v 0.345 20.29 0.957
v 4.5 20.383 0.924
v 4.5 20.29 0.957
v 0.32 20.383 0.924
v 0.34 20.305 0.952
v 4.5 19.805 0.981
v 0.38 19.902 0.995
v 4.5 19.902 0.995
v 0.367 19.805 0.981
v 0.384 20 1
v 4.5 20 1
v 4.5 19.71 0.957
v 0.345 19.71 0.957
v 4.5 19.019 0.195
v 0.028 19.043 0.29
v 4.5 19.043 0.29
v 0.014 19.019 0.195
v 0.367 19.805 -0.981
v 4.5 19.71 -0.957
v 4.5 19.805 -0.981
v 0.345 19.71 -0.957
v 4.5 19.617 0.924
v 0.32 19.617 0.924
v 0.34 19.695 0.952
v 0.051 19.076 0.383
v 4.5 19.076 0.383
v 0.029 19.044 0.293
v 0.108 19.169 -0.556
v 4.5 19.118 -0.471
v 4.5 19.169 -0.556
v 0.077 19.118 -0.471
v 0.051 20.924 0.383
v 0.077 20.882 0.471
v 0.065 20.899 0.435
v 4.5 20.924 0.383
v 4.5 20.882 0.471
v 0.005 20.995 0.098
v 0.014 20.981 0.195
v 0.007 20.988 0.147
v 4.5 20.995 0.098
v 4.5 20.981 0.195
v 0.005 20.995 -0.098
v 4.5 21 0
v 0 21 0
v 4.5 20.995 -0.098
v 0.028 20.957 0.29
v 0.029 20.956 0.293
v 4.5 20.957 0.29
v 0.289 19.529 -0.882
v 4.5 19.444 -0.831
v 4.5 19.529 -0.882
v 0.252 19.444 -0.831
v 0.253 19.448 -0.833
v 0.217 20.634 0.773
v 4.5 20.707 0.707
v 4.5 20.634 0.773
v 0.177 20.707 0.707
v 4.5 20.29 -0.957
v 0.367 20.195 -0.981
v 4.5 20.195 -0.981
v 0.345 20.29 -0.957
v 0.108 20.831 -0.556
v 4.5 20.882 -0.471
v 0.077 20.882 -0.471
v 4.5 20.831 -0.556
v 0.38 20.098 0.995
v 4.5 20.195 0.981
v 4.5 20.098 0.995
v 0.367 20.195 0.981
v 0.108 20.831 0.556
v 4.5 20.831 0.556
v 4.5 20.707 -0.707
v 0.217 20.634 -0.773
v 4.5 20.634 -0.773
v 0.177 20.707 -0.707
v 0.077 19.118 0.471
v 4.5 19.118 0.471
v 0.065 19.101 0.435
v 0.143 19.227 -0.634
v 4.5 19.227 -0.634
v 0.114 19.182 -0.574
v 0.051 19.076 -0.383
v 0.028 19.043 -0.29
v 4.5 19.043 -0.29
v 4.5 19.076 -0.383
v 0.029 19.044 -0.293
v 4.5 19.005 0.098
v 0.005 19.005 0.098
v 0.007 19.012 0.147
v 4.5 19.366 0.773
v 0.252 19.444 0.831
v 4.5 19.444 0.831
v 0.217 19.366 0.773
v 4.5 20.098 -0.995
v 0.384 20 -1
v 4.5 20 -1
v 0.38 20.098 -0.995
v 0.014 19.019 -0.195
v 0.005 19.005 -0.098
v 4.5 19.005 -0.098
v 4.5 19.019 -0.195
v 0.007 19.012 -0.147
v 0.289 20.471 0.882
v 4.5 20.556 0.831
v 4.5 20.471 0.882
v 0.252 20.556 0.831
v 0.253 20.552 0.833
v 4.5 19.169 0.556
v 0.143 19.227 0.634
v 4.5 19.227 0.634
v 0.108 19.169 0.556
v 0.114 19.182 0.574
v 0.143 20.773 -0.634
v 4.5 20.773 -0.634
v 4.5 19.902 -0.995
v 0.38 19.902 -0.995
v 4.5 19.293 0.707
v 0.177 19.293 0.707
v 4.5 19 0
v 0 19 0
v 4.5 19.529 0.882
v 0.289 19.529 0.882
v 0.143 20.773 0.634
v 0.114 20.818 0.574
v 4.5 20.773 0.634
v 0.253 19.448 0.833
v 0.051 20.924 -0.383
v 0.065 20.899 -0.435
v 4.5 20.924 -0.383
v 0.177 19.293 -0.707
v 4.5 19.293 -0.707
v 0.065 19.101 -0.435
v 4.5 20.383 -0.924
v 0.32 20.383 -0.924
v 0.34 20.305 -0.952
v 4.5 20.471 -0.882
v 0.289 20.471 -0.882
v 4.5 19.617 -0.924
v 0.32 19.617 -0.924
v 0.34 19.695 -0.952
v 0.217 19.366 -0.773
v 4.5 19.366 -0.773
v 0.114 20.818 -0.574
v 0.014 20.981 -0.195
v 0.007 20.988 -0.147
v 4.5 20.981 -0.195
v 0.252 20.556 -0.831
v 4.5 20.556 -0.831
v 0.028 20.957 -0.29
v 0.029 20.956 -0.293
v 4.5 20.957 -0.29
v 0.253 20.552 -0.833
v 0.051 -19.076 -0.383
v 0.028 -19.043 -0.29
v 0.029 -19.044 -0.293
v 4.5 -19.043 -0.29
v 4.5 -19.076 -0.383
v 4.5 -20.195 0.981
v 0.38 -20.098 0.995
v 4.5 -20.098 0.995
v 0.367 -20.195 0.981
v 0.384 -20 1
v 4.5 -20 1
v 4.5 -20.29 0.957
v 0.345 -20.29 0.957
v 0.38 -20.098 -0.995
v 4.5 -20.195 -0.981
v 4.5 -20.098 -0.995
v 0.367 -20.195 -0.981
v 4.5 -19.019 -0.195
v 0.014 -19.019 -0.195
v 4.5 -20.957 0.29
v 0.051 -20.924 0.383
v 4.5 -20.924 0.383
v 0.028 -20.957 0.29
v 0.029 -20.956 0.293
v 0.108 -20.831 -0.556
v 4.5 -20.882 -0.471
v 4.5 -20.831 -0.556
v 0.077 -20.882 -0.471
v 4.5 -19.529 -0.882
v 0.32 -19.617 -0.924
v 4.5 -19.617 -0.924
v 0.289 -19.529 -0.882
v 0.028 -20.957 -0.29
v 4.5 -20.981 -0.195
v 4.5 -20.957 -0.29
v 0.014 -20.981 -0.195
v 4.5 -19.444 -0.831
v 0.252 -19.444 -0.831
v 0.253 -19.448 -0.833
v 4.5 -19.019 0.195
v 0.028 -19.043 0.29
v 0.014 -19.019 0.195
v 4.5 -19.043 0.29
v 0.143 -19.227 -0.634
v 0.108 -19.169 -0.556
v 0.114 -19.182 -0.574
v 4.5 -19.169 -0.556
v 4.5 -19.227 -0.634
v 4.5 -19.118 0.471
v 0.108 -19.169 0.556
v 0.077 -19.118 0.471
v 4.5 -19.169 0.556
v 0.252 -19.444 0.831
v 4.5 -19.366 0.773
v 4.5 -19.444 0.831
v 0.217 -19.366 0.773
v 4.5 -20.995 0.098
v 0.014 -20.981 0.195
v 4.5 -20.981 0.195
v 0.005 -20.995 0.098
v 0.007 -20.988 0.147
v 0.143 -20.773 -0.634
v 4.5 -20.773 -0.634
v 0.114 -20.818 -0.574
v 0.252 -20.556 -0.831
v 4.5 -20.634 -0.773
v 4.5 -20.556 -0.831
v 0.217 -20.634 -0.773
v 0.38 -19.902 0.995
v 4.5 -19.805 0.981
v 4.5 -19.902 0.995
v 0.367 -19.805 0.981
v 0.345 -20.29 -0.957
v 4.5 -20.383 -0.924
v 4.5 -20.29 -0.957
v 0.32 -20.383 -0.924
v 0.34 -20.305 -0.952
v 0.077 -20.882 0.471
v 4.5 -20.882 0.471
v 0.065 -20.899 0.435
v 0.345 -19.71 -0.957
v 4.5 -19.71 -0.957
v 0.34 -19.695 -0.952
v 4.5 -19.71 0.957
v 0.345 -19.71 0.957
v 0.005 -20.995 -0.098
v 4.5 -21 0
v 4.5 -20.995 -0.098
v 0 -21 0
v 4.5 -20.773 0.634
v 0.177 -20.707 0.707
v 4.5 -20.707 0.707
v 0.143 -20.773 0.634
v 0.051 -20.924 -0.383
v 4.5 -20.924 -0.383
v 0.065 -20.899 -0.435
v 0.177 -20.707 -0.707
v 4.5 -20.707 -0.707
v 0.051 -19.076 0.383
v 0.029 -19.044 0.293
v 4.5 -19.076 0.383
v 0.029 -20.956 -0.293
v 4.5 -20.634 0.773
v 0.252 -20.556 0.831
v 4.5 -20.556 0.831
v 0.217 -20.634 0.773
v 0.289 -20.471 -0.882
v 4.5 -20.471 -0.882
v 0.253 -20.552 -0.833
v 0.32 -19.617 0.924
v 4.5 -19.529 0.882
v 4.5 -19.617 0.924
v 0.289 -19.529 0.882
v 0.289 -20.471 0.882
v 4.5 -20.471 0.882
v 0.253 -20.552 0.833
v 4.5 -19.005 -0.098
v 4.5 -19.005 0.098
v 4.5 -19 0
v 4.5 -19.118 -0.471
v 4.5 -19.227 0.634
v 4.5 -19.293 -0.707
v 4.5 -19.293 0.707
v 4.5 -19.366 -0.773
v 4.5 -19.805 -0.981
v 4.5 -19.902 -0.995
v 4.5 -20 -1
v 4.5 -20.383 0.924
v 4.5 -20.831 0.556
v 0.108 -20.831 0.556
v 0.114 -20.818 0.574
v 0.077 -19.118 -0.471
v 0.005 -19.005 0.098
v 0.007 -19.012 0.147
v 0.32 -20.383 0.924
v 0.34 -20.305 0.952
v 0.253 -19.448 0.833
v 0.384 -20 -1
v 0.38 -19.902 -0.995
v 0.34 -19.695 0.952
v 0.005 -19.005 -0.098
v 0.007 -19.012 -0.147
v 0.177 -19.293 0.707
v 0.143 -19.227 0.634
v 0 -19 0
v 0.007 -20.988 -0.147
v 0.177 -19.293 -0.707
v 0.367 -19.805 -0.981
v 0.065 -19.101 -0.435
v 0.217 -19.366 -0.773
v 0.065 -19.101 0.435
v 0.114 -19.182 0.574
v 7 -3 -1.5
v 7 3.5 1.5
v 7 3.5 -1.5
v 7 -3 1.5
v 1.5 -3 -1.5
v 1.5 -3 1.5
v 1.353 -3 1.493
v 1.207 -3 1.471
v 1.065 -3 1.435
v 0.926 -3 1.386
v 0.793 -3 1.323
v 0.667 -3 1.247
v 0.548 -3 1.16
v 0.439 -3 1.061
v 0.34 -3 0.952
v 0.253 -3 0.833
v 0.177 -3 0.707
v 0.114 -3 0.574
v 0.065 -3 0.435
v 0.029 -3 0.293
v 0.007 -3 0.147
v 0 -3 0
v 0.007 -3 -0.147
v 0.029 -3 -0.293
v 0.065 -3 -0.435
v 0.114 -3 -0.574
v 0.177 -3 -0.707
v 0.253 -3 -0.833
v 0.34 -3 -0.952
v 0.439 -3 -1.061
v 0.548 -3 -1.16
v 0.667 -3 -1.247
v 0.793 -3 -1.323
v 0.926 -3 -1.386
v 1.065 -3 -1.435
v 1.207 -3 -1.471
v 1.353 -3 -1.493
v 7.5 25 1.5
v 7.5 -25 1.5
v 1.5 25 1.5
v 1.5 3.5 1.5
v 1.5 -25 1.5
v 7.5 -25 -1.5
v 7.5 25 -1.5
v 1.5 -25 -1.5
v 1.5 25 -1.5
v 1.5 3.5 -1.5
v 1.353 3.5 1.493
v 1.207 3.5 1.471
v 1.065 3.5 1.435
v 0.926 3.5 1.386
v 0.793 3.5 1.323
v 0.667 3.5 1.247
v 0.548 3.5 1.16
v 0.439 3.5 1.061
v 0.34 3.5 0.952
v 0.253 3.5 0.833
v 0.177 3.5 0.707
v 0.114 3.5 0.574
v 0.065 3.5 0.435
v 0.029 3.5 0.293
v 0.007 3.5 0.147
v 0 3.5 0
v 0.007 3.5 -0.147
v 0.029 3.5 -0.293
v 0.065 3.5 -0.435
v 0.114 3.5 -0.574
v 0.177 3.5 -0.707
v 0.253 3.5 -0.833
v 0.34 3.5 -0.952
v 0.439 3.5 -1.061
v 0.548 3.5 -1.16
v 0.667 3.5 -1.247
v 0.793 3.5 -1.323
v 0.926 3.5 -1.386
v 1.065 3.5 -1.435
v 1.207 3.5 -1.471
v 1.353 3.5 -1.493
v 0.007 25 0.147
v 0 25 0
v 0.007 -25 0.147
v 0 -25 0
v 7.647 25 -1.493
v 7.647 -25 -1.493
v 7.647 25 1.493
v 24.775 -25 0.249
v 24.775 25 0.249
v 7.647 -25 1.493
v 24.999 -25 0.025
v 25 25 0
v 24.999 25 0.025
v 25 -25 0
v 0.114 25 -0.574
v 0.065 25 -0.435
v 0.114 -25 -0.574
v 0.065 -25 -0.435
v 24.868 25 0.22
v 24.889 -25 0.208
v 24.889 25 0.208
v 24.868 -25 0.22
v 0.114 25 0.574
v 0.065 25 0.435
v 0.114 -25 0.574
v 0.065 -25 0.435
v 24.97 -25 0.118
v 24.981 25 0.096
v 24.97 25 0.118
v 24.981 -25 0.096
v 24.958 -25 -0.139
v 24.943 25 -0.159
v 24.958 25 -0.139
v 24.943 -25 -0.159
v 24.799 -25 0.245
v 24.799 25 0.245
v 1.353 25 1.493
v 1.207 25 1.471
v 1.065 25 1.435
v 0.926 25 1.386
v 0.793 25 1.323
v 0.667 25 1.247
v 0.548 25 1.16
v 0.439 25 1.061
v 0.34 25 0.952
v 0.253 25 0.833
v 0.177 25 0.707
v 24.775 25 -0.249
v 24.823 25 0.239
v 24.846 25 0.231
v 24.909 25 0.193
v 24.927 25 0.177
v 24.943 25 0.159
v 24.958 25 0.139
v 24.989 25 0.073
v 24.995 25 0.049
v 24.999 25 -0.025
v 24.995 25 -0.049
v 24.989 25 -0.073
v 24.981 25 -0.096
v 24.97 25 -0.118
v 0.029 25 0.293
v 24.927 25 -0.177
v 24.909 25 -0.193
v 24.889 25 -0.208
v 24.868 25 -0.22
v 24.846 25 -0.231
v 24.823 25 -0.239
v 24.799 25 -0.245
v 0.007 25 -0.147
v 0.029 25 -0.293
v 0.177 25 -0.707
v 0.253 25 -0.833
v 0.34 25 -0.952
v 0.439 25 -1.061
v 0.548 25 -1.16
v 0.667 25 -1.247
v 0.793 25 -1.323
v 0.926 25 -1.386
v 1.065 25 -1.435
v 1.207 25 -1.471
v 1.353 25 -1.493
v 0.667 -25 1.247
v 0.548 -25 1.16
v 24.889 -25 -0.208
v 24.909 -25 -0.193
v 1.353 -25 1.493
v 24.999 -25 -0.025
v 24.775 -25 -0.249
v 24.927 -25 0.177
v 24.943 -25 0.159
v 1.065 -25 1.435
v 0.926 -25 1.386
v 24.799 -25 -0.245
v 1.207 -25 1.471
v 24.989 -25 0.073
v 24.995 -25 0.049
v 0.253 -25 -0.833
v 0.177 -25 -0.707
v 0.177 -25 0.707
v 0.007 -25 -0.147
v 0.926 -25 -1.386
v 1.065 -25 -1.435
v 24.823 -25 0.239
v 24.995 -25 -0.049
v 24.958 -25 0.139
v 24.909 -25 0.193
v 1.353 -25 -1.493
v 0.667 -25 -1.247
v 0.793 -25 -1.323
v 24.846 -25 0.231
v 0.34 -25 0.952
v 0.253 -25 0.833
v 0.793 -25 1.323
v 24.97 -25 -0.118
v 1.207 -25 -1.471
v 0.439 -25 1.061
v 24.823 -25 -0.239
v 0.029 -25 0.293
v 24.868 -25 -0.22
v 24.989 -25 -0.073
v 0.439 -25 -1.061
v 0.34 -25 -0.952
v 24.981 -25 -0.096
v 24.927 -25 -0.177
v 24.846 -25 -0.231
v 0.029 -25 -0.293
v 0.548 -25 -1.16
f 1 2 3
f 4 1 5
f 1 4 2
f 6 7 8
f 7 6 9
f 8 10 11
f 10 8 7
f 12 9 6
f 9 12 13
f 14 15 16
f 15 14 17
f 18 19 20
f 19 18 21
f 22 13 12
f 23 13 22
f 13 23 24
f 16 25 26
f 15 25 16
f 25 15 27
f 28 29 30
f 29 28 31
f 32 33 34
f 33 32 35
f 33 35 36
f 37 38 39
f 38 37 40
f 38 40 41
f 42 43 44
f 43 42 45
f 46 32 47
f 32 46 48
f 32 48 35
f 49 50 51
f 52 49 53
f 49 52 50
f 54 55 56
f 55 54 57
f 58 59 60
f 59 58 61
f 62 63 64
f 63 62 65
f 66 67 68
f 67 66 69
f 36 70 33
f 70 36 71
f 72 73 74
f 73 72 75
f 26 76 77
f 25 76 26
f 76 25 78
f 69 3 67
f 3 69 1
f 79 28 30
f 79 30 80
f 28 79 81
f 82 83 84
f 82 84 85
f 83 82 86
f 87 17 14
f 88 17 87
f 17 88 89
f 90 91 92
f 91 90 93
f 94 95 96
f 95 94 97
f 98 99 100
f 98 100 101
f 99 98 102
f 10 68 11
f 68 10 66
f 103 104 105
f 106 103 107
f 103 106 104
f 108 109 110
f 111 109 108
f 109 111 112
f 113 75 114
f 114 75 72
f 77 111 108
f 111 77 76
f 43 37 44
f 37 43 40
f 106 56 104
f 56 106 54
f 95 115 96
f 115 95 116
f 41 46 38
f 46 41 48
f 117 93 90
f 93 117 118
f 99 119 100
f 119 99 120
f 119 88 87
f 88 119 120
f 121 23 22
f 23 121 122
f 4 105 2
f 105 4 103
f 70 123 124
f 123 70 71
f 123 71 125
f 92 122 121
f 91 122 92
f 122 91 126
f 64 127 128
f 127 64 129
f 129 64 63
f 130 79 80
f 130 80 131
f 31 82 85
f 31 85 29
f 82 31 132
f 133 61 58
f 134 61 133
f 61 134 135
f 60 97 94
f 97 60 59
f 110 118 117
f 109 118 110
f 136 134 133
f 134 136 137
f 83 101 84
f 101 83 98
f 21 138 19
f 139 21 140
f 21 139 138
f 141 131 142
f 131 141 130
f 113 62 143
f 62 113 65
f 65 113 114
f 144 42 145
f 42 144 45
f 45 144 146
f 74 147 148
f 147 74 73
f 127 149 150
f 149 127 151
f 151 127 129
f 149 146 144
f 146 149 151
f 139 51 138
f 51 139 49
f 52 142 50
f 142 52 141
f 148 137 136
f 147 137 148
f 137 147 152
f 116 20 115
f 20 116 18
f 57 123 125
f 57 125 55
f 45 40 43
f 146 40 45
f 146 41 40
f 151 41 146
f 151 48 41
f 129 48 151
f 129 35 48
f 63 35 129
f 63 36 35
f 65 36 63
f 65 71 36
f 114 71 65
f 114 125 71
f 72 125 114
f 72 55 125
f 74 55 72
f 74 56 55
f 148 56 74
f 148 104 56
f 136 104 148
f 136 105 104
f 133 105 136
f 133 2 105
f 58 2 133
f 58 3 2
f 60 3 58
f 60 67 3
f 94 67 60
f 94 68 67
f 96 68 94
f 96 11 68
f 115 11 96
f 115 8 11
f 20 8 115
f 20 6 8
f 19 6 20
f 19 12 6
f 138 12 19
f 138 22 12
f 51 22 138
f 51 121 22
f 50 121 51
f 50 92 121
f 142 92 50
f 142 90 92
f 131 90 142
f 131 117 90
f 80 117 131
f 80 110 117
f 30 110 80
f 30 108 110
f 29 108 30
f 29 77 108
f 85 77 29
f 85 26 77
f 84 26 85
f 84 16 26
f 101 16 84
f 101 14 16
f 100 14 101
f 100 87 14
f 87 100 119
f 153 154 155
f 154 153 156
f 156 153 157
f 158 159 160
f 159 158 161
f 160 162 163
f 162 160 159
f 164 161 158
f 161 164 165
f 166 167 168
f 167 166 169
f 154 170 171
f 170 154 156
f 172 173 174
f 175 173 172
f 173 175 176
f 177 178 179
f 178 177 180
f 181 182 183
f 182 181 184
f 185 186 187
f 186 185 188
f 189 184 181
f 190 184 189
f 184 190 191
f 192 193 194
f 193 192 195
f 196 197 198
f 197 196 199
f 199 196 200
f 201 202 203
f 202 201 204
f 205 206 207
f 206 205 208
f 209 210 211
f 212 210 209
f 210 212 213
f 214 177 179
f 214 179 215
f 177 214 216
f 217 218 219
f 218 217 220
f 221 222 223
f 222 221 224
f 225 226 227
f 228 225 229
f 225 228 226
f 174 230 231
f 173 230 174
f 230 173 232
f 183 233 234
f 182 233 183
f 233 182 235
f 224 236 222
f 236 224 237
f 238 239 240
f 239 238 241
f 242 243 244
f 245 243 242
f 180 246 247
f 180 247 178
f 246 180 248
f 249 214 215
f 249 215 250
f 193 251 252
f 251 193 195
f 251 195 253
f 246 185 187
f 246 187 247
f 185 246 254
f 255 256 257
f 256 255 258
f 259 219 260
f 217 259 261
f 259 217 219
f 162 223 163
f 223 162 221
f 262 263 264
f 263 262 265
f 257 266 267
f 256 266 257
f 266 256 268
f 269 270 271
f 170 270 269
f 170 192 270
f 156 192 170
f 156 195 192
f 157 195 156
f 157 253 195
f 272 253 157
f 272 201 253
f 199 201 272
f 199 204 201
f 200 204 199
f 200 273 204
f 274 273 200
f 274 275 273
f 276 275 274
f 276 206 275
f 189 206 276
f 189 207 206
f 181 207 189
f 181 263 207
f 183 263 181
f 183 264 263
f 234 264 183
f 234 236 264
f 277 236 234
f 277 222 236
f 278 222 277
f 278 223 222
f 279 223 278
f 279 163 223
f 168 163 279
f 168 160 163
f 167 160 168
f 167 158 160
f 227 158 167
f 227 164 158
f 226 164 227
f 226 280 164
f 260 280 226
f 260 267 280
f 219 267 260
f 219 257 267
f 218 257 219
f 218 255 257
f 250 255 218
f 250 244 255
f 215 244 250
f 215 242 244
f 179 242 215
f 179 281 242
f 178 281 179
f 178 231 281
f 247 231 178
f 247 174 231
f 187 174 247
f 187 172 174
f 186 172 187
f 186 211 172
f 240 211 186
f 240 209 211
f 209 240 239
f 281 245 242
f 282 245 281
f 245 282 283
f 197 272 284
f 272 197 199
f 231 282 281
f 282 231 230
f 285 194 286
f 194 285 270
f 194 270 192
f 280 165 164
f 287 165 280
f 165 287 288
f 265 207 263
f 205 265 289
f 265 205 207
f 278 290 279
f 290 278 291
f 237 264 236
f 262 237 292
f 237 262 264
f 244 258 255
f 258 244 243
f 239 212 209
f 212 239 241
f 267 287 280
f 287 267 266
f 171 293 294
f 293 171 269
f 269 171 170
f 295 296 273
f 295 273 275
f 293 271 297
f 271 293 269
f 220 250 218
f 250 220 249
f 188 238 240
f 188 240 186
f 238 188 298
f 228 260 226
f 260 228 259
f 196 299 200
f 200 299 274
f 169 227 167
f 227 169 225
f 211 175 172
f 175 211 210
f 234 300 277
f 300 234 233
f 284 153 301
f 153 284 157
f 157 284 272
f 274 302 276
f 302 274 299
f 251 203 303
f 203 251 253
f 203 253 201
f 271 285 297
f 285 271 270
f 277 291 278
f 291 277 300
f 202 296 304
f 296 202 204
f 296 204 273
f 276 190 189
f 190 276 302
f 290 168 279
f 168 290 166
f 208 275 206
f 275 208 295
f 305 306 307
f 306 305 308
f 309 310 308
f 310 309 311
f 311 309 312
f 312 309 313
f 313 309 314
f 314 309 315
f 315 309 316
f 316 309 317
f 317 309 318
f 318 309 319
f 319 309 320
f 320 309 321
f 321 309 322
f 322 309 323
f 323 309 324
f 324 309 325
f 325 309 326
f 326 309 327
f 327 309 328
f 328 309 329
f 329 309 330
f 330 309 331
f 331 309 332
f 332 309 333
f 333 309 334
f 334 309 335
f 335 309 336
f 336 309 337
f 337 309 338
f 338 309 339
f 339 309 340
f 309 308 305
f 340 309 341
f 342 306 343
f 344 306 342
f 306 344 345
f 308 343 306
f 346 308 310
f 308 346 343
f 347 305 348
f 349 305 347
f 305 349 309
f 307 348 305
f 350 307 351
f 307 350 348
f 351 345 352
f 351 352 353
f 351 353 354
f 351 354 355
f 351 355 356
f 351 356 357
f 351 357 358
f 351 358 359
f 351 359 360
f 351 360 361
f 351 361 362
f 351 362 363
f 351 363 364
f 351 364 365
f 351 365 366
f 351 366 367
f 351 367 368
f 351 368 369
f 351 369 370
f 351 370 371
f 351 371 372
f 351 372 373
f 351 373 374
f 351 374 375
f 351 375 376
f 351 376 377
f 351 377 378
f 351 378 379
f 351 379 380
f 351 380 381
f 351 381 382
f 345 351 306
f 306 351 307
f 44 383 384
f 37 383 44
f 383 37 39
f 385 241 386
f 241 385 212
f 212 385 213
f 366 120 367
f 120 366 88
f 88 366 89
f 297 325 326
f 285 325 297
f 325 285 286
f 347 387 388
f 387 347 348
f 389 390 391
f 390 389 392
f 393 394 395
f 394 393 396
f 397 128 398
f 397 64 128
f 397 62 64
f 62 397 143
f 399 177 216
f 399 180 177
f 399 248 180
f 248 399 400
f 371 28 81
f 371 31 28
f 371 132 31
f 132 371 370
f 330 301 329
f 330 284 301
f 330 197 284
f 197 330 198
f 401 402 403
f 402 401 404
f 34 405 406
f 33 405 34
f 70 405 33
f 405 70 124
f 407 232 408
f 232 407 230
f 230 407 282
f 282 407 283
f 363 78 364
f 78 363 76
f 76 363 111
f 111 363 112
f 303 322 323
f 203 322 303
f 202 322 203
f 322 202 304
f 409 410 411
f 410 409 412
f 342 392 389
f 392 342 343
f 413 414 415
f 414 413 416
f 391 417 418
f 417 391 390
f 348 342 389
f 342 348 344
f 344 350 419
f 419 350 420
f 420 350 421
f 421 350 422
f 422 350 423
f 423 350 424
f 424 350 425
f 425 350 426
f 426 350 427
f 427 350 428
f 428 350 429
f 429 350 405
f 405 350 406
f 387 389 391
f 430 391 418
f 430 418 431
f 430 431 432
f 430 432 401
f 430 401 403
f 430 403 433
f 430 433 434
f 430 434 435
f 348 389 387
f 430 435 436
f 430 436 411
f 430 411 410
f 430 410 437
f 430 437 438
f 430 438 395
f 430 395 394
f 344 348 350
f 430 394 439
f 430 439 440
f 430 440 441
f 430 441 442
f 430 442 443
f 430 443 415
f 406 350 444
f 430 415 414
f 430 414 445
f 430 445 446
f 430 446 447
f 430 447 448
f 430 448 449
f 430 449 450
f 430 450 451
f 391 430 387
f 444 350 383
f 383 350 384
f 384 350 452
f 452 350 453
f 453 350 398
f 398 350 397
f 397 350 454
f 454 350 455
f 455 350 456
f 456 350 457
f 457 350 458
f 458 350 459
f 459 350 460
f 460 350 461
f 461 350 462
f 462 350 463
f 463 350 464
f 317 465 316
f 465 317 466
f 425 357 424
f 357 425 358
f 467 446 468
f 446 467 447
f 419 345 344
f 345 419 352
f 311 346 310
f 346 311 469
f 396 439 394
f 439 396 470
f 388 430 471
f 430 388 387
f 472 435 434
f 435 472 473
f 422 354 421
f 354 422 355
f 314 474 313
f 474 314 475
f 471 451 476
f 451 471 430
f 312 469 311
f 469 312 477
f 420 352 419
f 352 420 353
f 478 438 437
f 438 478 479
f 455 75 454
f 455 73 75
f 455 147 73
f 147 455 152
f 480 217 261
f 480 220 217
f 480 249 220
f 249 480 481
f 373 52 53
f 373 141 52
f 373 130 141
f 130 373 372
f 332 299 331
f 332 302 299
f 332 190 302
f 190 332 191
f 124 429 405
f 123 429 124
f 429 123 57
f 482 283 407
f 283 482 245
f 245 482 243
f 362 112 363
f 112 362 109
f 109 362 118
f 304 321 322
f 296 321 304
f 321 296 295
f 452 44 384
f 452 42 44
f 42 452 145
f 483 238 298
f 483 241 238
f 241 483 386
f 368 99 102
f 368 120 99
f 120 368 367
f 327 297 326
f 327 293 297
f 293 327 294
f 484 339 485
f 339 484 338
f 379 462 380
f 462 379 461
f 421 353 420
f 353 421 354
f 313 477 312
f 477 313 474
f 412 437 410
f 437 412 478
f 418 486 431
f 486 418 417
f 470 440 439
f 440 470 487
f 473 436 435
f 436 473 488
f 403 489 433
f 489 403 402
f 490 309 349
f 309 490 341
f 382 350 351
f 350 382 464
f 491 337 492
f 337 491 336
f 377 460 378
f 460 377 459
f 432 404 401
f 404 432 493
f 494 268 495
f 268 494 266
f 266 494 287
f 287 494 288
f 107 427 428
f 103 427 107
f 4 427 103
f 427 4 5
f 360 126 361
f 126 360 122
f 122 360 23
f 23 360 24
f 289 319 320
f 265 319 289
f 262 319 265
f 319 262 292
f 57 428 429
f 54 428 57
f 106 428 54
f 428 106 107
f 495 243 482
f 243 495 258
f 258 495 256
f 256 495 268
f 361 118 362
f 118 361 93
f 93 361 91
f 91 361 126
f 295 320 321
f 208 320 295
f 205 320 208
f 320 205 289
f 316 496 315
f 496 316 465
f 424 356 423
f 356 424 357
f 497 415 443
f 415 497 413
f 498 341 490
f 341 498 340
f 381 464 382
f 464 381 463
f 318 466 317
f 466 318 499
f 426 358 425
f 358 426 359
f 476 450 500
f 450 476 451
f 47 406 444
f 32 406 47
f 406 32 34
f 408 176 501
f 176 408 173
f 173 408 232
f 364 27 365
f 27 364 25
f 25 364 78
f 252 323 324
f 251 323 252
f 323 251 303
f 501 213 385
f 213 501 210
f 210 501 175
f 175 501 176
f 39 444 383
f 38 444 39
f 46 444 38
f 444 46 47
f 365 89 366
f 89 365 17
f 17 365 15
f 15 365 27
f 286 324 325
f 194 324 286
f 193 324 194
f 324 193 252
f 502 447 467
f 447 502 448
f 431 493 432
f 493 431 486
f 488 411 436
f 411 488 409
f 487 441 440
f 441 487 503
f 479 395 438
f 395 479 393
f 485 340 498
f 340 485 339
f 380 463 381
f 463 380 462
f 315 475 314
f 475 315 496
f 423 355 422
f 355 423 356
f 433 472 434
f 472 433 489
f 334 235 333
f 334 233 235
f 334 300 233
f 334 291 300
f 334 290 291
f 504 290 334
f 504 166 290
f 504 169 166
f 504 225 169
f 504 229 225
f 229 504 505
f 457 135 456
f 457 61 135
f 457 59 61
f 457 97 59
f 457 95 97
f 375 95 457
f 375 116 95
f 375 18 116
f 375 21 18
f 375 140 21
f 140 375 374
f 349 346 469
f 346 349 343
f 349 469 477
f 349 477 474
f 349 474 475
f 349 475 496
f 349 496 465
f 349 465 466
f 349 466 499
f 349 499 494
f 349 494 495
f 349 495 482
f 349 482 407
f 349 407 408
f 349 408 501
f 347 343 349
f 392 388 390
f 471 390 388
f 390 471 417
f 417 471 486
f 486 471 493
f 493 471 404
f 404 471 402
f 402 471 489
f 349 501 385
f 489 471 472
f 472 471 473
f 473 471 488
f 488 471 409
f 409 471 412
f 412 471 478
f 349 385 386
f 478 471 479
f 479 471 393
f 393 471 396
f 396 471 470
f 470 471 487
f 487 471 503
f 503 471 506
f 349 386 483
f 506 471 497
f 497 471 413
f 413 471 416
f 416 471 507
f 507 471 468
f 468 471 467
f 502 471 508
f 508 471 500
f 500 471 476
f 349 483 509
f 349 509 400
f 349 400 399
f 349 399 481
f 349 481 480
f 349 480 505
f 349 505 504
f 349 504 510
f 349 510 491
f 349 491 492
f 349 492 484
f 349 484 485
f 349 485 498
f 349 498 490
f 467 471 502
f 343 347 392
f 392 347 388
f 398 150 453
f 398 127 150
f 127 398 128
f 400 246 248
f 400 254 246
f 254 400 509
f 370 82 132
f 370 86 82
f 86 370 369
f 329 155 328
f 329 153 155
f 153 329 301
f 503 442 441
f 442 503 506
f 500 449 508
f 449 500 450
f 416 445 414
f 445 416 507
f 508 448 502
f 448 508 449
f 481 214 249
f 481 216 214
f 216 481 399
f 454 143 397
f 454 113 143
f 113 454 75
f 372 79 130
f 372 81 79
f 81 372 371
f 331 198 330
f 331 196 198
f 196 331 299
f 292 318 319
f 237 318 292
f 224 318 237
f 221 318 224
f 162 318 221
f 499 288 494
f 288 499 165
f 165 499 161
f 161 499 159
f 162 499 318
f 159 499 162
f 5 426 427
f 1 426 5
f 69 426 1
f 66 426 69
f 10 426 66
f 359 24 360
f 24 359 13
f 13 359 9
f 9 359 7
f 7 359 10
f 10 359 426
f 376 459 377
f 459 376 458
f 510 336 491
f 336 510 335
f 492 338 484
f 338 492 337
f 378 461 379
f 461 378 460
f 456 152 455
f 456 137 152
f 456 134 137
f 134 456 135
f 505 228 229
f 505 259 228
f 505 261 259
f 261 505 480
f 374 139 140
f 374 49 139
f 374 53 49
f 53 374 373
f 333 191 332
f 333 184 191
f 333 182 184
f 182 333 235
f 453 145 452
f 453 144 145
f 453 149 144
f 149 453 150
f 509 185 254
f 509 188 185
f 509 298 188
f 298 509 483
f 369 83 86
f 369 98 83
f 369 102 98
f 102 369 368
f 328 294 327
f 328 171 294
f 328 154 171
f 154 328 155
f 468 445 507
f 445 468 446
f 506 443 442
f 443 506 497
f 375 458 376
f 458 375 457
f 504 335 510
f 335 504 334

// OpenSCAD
// file: config.scad
// config.scad - Central configuration for Rocket Fin Servo Mount System
// All dimensions in millimeters

// ============================================================================
// SERVO SPECIFICATIONS (3.7g Micro Servo)
// ============================================================================

servo_body_length = 20.0;      // X dimension
servo_body_width = 8.75;       // Y dimension
servo_body_height = 22.0;      // Z dimension (including gear case)
servo_tab_thickness = 2.0;     // Mounting tab thickness
servo_tab_extension = 2.0;     // How far tabs extend beyond body
servo_tab_height = 15.5;       // Height from bottom to tab underside
servo_shaft_diameter = 4.0;    // Output shaft diameter
servo_shaft_offset_x = 5.0;    // Shaft offset from body center (toward one end)
servo_shaft_offset_z = 2.0;    // Shaft height above body top
servo_cable_diameter = 3.0;    // Cable bundle diameter

// Clearances for servo pocket
servo_clearance = 0.3;         // Extra space around servo body

// ============================================================================
// FIN SPECIFICATIONS
// ============================================================================

fin_thickness = 4.0;           // Carbon fibre fin thickness
fin_slot_clearance = 0.2;      // Extra space in slot for easy insertion
fin_engagement_depth = 10.0;   // How deep fin inserts into mount

// ============================================================================
// AILERON SPECIFICATIONS
// ============================================================================

aileron_span = 50.0;           // Y dimension (along fin span)
aileron_chord = 25.0;          // X dimension (depth in flow direction)
aileron_thickness = 3.0;       // Z dimension (max thickness)
aileron_le_radius = 1.5;       // Leading edge radius (full round)
aileron_te_thickness = 0.5;    // Trailing edge minimum thickness
aileron_max_deflection = 30;   // Maximum deflection in degrees

// Hinge geometry
aileron_hinge_hole_dia = 2.0;  // For M2 pins
aileron_hinge_spacing = 40.0;  // Distance between hinge holes
aileron_hinge_offset = 2.0;    // Distance from leading edge to hinge center

// Servo interface
aileron_slot_width = 3.0;      // Width of adapter slot
aileron_slot_depth = 5.0;      // Depth of adapter slot

// ============================================================================
// SERVO MOUNT HOUSING
// ============================================================================

mount_wall_thickness = 2.0;    // Minimum wall thickness
mount_fairing_radius = 8.0;    // Rounding on leading/trailing edges
mount_total_length = 35.0;     // Overall X dimension
mount_total_width = 16.0;      // Overall Y dimension

// Calculated pocket dimensions (with clearances)
mount_pocket_length = servo_body_length + servo_clearance;
mount_pocket_width = servo_body_width + servo_clearance;
mount_pocket_height = servo_body_height + servo_clearance;

// Wire channel
wire_channel_diameter = 4.0;   // Diameter of cable routing channel

// Retention features
retention_barb_height = 0.8;   // Height of retention barbs
retention_barb_depth = 1.0;    // Depth of barb engagement

// ============================================================================
// SERVO ARM ADAPTER
// ============================================================================

adapter_horn_plate_dia = 7.0;  // Diameter of horn interface plate
adapter_horn_hole_dia = 1.5;   // Holes for horn screws
adapter_horn_hole_spacing = 4.0; // Spacing between horn holes (cross pattern)
adapter_post_height = 8.0;     // Height of connecting post
adapter_post_diameter = 3.0;   // Diameter of post
adapter_tab_width = 2.8;       // Width of aileron interface tab
adapter_tab_depth = 4.0;       // Depth of tab insertion
adapter_tab_height = 5.0;      // Height of tab

// ============================================================================
// HARDWARE
// ============================================================================

m2_hole_diameter = 2.2;        // Clearance hole for M2 screw
m2_tap_diameter = 1.8;         // Tap hole for M2 thread
hinge_pin_diameter = 2.0;      // M2 rod for hinge
hinge_pin_length = 12.0;       // Length of hinge pins

// ============================================================================
// RENDERING SETTINGS
// ============================================================================

$fn = 64;                      // Circle resolution for final renders
$fa = 2;                       // Minimum angle for arc segments
$fs = 0.5;                     // Minimum segment size

// Preview quality (use these for faster rendering during development)
preview_fn = 32;

// ============================================================================
// COLORS (for assembly visualization)
// ============================================================================

color_mount = [0.3, 0.3, 0.35];      // Dark grey
color_aileron = [0.9, 0.9, 0.95];    // Light grey/white
color_adapter = [0.2, 0.5, 0.8];     // Blue
color_servo = [0.1, 0.1, 0.15];      // Near black
color_fin = [0.15, 0.15, 0.15];      // Carbon black

// ============================================================================
// UTILITY FUNCTIONS
// ============================================================================

// Convert degrees to radians
function deg2rad(d) = d * PI / 180;

// Calculate hypotenuse
function hyp(a, b) = sqrt(a*a + b*b);
// main file
// aileron.scad - Movable control surface for rocket fin
// Rocket Fin Servo Mount System

include <config.scad>

// ============================================================================
// MAIN MODULE
// ============================================================================

module aileron() {
    difference() {
        // Main aileron body with airfoil profile
        aileron_body();

        // Hinge holes
        hinge_holes();

        // Servo adapter slot
        adapter_slot();
    }
}

// ============================================================================
// SUB-MODULES
// ============================================================================

// Main aileron body with streamlined profile
module aileron_body() {
    // Create airfoil-like cross section extruded along span
    linear_extrude(height = aileron_span, center = true) {
        aileron_profile();
    }
}

// 2D airfoil-like profile for the aileron
module aileron_profile() {
    // Symmetric profile with:
    // - Rounded leading edge
    // - Maximum thickness at ~30% chord
    // - Tapered trailing edge

    // Using hull of circles to create smooth shape
    hull() {
        // Leading edge - full round
        translate([aileron_le_radius, 0])
            circle(r = aileron_le_radius);

        // Maximum thickness point (at 30% chord)
        translate([aileron_chord * 0.3, 0])
            scale([1, aileron_thickness / aileron_le_radius / 2])
                circle(r = aileron_le_radius);

        // Trailing edge - thin
        translate([aileron_chord - aileron_te_thickness/2, 0])
            scale([aileron_te_thickness/2, aileron_te_thickness/2])
                circle(r = 1);
    }
}

// Hinge holes at leading edge
module hinge_holes() {
    // Two holes symmetrically placed
    for (y = [-aileron_hinge_spacing/2, aileron_hinge_spacing/2]) {
        translate([aileron_hinge_offset, 0, y])
            rotate([0, 0, 90])
                rotate([90, 0, 0])
                    cylinder(h = aileron_thickness + 2, d = aileron_hinge_hole_dia, center = true);
    }
}

// Slot for servo arm adapter
module adapter_slot() {
    // Centered slot at hinge line
    translate([aileron_hinge_offset, 0, 0]) {
        // Main slot
        cube([aileron_slot_depth * 2, aileron_slot_width, adapter_tab_height + 1], center = true);

        // Widen at bottom for adapter insertion
        translate([0, 0, -adapter_tab_height/2])
            cube([aileron_slot_depth * 2, aileron_slot_width + 1, 2], center = true);
    }
}

// ============================================================================
// RENDER
// ============================================================================

// Render the aileron
// Oriented for printing: flat on bed
color(color_aileron)
    rotate([90, 0, 0])  // Rotate so span is along Y, chord along X
        aileron();

// ============================================================================
// VARIATIONS
// ============================================================================

// Thicker aileron variant (for higher loads)
module aileron_thick() {
    scale([1, 1.5, 1])  // 50% thicker
        aileron();
}

// Aileron with lightening holes (weight reduction)
module aileron_lightened() {
    difference() {
        aileron();

        // Lightening holes along span
        for (y = [-aileron_hinge_spacing/3, 0, aileron_hinge_spacing/3]) {
            translate([aileron_chord * 0.5, 0, y])
                rotate([0, 0, 90])
                    cylinder(h = aileron_thickness + 2, d = 8, center = true);
        }
    }
}
